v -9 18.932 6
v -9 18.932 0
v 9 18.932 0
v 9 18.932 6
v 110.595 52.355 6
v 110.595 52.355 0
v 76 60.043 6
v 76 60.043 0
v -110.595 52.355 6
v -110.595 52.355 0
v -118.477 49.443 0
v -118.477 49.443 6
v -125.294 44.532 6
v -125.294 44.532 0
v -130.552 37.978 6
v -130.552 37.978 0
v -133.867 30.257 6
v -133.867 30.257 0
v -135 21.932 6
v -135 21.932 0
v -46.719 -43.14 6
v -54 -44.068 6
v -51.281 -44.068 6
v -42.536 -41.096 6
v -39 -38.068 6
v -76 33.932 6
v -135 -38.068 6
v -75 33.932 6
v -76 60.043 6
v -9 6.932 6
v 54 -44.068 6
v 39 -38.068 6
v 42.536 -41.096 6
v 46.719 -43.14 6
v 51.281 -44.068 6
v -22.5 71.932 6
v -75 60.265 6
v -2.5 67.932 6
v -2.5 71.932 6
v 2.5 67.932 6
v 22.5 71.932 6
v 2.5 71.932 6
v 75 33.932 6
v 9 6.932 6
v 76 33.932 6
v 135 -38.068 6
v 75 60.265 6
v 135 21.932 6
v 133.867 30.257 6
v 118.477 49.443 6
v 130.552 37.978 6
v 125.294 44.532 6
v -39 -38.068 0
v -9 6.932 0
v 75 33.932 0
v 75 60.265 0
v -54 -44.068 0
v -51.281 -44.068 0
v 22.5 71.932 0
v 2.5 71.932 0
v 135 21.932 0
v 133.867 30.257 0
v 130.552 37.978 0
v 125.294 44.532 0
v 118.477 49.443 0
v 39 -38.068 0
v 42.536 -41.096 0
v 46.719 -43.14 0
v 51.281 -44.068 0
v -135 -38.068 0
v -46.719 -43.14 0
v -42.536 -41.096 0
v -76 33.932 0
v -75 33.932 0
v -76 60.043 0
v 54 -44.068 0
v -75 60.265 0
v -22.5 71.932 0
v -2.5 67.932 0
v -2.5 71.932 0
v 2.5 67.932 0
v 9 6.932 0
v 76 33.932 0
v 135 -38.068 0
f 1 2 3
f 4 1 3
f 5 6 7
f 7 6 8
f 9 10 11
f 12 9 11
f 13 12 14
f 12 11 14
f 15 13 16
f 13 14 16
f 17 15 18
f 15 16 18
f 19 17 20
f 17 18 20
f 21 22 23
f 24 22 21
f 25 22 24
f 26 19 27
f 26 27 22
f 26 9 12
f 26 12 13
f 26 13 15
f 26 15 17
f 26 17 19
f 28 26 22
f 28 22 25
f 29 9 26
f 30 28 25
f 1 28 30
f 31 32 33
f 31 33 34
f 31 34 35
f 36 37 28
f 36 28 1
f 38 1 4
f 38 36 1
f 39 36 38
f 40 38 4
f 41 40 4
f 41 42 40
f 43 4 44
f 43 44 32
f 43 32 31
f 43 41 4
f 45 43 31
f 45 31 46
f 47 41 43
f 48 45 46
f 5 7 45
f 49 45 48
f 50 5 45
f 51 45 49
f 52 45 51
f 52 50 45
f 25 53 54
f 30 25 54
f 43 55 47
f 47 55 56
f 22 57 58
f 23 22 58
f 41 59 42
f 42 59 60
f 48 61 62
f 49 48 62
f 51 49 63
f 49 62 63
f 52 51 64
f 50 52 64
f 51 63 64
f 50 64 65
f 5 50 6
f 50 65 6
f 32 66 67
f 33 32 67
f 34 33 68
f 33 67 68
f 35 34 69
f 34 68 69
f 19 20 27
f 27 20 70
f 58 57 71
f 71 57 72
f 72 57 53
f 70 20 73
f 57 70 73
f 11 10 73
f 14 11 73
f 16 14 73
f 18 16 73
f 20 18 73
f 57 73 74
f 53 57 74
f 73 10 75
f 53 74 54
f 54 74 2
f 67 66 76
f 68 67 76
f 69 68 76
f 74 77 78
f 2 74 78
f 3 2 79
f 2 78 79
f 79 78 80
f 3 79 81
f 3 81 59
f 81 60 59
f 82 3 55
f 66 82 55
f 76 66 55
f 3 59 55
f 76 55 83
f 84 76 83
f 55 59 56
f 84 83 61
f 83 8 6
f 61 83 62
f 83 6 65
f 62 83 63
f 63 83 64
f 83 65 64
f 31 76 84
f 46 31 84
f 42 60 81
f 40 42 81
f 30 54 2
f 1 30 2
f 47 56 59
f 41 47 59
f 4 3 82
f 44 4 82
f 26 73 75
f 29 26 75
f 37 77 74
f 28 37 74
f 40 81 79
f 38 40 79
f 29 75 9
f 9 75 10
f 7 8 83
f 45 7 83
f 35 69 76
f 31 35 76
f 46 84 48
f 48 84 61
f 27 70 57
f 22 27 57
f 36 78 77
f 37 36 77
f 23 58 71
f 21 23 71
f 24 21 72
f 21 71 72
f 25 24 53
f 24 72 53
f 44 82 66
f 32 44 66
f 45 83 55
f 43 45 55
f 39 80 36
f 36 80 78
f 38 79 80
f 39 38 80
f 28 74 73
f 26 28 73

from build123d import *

# Parameters (mm, degrees)
F1_DEPTH = 6


with BuildPart() as f1:
    # F0 (on Top) → F1 (new body)
    with BuildSketch(Plane.XY):
        with BuildLine():
            Line((-135, 21.9318206776), (-135, -38.0681793224))
            Line((-135, -38.0681793224), (-54, -38.0681793224))
            Line((-54, -38.0681793224), (-39, -38.0681793224))
            Line((-39, -38.0681793224), (-39, 6.9318206776))
            Line((-39, 6.9318206776), (-9, 6.9318206776))
            Line((-9, 6.9318206776), (-9, 18.9318206776))
            Line((-9, 18.9318206776), (-9, 33.9318206776))
            Line((-9, 33.9318206776), (-75, 33.9318206776))
            Line((-75, 33.9318206776), (-76, 33.9318206776))
            Line((-76, 33.9318206776), (-76, 46.9318206776))
            Line((-76, 46.9318206776), (-122.4432589807, 46.9318206776))
            ThreePointArc((-122.4432589807, 46.9318206776), (-131.6844515136, 35.9199562309), (-135, 21.9318206776))
        make_face()
        Polygon((-39, 6.9318206776), (-39, -38.0681793224), (-9, 6.9318206776), align=None)
        Polygon((9, 6.9318206776), (39, -38.0681793224), (39, 6.9318206776), align=None)
        with BuildLine():
            Line((54, -38.0681793224), (135, -38.0681793224))
            Line((135, -38.0681793224), (135, 21.9318206776))
            ThreePointArc((135, 21.9318206776), (131.6844515136, 35.9199562309), (122.4432589807, 46.9318206776))
            Line((122.4432589807, 46.9318206776), (76, 46.9318206776))
            Line((76, 46.9318206776), (76, 33.9318206776))
            Line((76, 33.9318206776), (75, 33.9318206776))
            Line((75, 33.9318206776), (9, 33.9318206776))
            Line((9, 33.9318206776), (9, 18.9318206776))
            Line((9, 18.9318206776), (9, 6.9318206776))
            Line((9, 6.9318206776), (39, 6.9318206776))
            Line((39, 6.9318206776), (39, -38.0681793224))
            Line((39, -38.0681793224), (54, -38.0681793224))
        make_face()
        with BuildLine():
            Line((-39, -38.0681793224), (-54, -38.0681793224))
            Line((-54, -38.0681793224), (-54, -44.0681793224))
            Line((-54, -44.0681793224), (-51.28125, -44.0681793224))
            ThreePointArc((-51.28125, -44.0681793224), (-44.5628777893, -42.2507556443), (-39, -38.0681793224))
        make_face()
        Polygon((-54, -38.0681793224), (-135, -38.0681793224), (-54, -44.0681793224), align=None)
        with BuildLine():
            Line((54, -44.0681793224), (54, -38.0681793224))
            Line((54, -38.0681793224), (39, -38.0681793224))
            ThreePointArc((39, -38.0681793224), (44.5628777893, -42.2507556443), (51.28125, -44.0681793224))
            Line((51.28125, -44.0681793224), (54, -44.0681793224))
        make_face()
        Polygon((54, -44.0681793224), (135, -38.0681793224), (54, -38.0681793224), align=None)
        Polygon((75, 33.9318206776), (75, 46.9318206776), (-75, 46.9318206776), (-75, 33.9318206776), (-9, 33.9318206776), (0, 33.9318206776), (9, 33.9318206776), align=None)
        Polygon((22.5, 62.9270896316), (22.5, 71.9318206776), (2.5, 71.9318206776), (2.5, 67.9318206776), (-2.5, 67.9318206776), (-2.5, 71.9318206776), (-22.5, 71.9318206776), (-22.5, 62.9270896316), align=None)
        with BuildLine():
            ThreePointArc((-110.5953234954, 52.3550821231), (-116.8058887661, 50.2695670793), (-122.4432589807, 46.9318206776))
            Line((-122.4432589807, 46.9318206776), (-76, 46.9318206776))
            Line((-76, 46.9318206776), (-76, 60.0429317887))
            Line((-76, 60.0429317887), (-110.5953234954, 52.3550821231))
        make_face()
        with BuildLine():
            Line((76, 46.9318206776), (122.4432589807, 46.9318206776))
            ThreePointArc((122.4432589807, 46.9318206776), (116.8058887661, 50.2695670793), (110.5953234954, 52.3550821231))
            Line((110.5953234954, 52.3550821231), (76, 60.0429317887))
            Line((76, 60.0429317887), (76, 46.9318206776))
        make_face()
        Polygon((-75, 46.9318206776), (75, 46.9318206776), (75, 60.2651540109), (22.5, 71.9318206776), (22.5, 62.9270896316), (-22.5, 62.9270896316), (-22.5, 71.9318206776), (-75, 60.2651540109), align=None)
        Polygon((-9, 18.9318206776), (9, 18.9318206776), (9, 33.9318206776), (0, 33.9318206776), (-9, 33.9318206776), align=None)
    extrude(amount=F1_DEPTH)


solid = f1.part
